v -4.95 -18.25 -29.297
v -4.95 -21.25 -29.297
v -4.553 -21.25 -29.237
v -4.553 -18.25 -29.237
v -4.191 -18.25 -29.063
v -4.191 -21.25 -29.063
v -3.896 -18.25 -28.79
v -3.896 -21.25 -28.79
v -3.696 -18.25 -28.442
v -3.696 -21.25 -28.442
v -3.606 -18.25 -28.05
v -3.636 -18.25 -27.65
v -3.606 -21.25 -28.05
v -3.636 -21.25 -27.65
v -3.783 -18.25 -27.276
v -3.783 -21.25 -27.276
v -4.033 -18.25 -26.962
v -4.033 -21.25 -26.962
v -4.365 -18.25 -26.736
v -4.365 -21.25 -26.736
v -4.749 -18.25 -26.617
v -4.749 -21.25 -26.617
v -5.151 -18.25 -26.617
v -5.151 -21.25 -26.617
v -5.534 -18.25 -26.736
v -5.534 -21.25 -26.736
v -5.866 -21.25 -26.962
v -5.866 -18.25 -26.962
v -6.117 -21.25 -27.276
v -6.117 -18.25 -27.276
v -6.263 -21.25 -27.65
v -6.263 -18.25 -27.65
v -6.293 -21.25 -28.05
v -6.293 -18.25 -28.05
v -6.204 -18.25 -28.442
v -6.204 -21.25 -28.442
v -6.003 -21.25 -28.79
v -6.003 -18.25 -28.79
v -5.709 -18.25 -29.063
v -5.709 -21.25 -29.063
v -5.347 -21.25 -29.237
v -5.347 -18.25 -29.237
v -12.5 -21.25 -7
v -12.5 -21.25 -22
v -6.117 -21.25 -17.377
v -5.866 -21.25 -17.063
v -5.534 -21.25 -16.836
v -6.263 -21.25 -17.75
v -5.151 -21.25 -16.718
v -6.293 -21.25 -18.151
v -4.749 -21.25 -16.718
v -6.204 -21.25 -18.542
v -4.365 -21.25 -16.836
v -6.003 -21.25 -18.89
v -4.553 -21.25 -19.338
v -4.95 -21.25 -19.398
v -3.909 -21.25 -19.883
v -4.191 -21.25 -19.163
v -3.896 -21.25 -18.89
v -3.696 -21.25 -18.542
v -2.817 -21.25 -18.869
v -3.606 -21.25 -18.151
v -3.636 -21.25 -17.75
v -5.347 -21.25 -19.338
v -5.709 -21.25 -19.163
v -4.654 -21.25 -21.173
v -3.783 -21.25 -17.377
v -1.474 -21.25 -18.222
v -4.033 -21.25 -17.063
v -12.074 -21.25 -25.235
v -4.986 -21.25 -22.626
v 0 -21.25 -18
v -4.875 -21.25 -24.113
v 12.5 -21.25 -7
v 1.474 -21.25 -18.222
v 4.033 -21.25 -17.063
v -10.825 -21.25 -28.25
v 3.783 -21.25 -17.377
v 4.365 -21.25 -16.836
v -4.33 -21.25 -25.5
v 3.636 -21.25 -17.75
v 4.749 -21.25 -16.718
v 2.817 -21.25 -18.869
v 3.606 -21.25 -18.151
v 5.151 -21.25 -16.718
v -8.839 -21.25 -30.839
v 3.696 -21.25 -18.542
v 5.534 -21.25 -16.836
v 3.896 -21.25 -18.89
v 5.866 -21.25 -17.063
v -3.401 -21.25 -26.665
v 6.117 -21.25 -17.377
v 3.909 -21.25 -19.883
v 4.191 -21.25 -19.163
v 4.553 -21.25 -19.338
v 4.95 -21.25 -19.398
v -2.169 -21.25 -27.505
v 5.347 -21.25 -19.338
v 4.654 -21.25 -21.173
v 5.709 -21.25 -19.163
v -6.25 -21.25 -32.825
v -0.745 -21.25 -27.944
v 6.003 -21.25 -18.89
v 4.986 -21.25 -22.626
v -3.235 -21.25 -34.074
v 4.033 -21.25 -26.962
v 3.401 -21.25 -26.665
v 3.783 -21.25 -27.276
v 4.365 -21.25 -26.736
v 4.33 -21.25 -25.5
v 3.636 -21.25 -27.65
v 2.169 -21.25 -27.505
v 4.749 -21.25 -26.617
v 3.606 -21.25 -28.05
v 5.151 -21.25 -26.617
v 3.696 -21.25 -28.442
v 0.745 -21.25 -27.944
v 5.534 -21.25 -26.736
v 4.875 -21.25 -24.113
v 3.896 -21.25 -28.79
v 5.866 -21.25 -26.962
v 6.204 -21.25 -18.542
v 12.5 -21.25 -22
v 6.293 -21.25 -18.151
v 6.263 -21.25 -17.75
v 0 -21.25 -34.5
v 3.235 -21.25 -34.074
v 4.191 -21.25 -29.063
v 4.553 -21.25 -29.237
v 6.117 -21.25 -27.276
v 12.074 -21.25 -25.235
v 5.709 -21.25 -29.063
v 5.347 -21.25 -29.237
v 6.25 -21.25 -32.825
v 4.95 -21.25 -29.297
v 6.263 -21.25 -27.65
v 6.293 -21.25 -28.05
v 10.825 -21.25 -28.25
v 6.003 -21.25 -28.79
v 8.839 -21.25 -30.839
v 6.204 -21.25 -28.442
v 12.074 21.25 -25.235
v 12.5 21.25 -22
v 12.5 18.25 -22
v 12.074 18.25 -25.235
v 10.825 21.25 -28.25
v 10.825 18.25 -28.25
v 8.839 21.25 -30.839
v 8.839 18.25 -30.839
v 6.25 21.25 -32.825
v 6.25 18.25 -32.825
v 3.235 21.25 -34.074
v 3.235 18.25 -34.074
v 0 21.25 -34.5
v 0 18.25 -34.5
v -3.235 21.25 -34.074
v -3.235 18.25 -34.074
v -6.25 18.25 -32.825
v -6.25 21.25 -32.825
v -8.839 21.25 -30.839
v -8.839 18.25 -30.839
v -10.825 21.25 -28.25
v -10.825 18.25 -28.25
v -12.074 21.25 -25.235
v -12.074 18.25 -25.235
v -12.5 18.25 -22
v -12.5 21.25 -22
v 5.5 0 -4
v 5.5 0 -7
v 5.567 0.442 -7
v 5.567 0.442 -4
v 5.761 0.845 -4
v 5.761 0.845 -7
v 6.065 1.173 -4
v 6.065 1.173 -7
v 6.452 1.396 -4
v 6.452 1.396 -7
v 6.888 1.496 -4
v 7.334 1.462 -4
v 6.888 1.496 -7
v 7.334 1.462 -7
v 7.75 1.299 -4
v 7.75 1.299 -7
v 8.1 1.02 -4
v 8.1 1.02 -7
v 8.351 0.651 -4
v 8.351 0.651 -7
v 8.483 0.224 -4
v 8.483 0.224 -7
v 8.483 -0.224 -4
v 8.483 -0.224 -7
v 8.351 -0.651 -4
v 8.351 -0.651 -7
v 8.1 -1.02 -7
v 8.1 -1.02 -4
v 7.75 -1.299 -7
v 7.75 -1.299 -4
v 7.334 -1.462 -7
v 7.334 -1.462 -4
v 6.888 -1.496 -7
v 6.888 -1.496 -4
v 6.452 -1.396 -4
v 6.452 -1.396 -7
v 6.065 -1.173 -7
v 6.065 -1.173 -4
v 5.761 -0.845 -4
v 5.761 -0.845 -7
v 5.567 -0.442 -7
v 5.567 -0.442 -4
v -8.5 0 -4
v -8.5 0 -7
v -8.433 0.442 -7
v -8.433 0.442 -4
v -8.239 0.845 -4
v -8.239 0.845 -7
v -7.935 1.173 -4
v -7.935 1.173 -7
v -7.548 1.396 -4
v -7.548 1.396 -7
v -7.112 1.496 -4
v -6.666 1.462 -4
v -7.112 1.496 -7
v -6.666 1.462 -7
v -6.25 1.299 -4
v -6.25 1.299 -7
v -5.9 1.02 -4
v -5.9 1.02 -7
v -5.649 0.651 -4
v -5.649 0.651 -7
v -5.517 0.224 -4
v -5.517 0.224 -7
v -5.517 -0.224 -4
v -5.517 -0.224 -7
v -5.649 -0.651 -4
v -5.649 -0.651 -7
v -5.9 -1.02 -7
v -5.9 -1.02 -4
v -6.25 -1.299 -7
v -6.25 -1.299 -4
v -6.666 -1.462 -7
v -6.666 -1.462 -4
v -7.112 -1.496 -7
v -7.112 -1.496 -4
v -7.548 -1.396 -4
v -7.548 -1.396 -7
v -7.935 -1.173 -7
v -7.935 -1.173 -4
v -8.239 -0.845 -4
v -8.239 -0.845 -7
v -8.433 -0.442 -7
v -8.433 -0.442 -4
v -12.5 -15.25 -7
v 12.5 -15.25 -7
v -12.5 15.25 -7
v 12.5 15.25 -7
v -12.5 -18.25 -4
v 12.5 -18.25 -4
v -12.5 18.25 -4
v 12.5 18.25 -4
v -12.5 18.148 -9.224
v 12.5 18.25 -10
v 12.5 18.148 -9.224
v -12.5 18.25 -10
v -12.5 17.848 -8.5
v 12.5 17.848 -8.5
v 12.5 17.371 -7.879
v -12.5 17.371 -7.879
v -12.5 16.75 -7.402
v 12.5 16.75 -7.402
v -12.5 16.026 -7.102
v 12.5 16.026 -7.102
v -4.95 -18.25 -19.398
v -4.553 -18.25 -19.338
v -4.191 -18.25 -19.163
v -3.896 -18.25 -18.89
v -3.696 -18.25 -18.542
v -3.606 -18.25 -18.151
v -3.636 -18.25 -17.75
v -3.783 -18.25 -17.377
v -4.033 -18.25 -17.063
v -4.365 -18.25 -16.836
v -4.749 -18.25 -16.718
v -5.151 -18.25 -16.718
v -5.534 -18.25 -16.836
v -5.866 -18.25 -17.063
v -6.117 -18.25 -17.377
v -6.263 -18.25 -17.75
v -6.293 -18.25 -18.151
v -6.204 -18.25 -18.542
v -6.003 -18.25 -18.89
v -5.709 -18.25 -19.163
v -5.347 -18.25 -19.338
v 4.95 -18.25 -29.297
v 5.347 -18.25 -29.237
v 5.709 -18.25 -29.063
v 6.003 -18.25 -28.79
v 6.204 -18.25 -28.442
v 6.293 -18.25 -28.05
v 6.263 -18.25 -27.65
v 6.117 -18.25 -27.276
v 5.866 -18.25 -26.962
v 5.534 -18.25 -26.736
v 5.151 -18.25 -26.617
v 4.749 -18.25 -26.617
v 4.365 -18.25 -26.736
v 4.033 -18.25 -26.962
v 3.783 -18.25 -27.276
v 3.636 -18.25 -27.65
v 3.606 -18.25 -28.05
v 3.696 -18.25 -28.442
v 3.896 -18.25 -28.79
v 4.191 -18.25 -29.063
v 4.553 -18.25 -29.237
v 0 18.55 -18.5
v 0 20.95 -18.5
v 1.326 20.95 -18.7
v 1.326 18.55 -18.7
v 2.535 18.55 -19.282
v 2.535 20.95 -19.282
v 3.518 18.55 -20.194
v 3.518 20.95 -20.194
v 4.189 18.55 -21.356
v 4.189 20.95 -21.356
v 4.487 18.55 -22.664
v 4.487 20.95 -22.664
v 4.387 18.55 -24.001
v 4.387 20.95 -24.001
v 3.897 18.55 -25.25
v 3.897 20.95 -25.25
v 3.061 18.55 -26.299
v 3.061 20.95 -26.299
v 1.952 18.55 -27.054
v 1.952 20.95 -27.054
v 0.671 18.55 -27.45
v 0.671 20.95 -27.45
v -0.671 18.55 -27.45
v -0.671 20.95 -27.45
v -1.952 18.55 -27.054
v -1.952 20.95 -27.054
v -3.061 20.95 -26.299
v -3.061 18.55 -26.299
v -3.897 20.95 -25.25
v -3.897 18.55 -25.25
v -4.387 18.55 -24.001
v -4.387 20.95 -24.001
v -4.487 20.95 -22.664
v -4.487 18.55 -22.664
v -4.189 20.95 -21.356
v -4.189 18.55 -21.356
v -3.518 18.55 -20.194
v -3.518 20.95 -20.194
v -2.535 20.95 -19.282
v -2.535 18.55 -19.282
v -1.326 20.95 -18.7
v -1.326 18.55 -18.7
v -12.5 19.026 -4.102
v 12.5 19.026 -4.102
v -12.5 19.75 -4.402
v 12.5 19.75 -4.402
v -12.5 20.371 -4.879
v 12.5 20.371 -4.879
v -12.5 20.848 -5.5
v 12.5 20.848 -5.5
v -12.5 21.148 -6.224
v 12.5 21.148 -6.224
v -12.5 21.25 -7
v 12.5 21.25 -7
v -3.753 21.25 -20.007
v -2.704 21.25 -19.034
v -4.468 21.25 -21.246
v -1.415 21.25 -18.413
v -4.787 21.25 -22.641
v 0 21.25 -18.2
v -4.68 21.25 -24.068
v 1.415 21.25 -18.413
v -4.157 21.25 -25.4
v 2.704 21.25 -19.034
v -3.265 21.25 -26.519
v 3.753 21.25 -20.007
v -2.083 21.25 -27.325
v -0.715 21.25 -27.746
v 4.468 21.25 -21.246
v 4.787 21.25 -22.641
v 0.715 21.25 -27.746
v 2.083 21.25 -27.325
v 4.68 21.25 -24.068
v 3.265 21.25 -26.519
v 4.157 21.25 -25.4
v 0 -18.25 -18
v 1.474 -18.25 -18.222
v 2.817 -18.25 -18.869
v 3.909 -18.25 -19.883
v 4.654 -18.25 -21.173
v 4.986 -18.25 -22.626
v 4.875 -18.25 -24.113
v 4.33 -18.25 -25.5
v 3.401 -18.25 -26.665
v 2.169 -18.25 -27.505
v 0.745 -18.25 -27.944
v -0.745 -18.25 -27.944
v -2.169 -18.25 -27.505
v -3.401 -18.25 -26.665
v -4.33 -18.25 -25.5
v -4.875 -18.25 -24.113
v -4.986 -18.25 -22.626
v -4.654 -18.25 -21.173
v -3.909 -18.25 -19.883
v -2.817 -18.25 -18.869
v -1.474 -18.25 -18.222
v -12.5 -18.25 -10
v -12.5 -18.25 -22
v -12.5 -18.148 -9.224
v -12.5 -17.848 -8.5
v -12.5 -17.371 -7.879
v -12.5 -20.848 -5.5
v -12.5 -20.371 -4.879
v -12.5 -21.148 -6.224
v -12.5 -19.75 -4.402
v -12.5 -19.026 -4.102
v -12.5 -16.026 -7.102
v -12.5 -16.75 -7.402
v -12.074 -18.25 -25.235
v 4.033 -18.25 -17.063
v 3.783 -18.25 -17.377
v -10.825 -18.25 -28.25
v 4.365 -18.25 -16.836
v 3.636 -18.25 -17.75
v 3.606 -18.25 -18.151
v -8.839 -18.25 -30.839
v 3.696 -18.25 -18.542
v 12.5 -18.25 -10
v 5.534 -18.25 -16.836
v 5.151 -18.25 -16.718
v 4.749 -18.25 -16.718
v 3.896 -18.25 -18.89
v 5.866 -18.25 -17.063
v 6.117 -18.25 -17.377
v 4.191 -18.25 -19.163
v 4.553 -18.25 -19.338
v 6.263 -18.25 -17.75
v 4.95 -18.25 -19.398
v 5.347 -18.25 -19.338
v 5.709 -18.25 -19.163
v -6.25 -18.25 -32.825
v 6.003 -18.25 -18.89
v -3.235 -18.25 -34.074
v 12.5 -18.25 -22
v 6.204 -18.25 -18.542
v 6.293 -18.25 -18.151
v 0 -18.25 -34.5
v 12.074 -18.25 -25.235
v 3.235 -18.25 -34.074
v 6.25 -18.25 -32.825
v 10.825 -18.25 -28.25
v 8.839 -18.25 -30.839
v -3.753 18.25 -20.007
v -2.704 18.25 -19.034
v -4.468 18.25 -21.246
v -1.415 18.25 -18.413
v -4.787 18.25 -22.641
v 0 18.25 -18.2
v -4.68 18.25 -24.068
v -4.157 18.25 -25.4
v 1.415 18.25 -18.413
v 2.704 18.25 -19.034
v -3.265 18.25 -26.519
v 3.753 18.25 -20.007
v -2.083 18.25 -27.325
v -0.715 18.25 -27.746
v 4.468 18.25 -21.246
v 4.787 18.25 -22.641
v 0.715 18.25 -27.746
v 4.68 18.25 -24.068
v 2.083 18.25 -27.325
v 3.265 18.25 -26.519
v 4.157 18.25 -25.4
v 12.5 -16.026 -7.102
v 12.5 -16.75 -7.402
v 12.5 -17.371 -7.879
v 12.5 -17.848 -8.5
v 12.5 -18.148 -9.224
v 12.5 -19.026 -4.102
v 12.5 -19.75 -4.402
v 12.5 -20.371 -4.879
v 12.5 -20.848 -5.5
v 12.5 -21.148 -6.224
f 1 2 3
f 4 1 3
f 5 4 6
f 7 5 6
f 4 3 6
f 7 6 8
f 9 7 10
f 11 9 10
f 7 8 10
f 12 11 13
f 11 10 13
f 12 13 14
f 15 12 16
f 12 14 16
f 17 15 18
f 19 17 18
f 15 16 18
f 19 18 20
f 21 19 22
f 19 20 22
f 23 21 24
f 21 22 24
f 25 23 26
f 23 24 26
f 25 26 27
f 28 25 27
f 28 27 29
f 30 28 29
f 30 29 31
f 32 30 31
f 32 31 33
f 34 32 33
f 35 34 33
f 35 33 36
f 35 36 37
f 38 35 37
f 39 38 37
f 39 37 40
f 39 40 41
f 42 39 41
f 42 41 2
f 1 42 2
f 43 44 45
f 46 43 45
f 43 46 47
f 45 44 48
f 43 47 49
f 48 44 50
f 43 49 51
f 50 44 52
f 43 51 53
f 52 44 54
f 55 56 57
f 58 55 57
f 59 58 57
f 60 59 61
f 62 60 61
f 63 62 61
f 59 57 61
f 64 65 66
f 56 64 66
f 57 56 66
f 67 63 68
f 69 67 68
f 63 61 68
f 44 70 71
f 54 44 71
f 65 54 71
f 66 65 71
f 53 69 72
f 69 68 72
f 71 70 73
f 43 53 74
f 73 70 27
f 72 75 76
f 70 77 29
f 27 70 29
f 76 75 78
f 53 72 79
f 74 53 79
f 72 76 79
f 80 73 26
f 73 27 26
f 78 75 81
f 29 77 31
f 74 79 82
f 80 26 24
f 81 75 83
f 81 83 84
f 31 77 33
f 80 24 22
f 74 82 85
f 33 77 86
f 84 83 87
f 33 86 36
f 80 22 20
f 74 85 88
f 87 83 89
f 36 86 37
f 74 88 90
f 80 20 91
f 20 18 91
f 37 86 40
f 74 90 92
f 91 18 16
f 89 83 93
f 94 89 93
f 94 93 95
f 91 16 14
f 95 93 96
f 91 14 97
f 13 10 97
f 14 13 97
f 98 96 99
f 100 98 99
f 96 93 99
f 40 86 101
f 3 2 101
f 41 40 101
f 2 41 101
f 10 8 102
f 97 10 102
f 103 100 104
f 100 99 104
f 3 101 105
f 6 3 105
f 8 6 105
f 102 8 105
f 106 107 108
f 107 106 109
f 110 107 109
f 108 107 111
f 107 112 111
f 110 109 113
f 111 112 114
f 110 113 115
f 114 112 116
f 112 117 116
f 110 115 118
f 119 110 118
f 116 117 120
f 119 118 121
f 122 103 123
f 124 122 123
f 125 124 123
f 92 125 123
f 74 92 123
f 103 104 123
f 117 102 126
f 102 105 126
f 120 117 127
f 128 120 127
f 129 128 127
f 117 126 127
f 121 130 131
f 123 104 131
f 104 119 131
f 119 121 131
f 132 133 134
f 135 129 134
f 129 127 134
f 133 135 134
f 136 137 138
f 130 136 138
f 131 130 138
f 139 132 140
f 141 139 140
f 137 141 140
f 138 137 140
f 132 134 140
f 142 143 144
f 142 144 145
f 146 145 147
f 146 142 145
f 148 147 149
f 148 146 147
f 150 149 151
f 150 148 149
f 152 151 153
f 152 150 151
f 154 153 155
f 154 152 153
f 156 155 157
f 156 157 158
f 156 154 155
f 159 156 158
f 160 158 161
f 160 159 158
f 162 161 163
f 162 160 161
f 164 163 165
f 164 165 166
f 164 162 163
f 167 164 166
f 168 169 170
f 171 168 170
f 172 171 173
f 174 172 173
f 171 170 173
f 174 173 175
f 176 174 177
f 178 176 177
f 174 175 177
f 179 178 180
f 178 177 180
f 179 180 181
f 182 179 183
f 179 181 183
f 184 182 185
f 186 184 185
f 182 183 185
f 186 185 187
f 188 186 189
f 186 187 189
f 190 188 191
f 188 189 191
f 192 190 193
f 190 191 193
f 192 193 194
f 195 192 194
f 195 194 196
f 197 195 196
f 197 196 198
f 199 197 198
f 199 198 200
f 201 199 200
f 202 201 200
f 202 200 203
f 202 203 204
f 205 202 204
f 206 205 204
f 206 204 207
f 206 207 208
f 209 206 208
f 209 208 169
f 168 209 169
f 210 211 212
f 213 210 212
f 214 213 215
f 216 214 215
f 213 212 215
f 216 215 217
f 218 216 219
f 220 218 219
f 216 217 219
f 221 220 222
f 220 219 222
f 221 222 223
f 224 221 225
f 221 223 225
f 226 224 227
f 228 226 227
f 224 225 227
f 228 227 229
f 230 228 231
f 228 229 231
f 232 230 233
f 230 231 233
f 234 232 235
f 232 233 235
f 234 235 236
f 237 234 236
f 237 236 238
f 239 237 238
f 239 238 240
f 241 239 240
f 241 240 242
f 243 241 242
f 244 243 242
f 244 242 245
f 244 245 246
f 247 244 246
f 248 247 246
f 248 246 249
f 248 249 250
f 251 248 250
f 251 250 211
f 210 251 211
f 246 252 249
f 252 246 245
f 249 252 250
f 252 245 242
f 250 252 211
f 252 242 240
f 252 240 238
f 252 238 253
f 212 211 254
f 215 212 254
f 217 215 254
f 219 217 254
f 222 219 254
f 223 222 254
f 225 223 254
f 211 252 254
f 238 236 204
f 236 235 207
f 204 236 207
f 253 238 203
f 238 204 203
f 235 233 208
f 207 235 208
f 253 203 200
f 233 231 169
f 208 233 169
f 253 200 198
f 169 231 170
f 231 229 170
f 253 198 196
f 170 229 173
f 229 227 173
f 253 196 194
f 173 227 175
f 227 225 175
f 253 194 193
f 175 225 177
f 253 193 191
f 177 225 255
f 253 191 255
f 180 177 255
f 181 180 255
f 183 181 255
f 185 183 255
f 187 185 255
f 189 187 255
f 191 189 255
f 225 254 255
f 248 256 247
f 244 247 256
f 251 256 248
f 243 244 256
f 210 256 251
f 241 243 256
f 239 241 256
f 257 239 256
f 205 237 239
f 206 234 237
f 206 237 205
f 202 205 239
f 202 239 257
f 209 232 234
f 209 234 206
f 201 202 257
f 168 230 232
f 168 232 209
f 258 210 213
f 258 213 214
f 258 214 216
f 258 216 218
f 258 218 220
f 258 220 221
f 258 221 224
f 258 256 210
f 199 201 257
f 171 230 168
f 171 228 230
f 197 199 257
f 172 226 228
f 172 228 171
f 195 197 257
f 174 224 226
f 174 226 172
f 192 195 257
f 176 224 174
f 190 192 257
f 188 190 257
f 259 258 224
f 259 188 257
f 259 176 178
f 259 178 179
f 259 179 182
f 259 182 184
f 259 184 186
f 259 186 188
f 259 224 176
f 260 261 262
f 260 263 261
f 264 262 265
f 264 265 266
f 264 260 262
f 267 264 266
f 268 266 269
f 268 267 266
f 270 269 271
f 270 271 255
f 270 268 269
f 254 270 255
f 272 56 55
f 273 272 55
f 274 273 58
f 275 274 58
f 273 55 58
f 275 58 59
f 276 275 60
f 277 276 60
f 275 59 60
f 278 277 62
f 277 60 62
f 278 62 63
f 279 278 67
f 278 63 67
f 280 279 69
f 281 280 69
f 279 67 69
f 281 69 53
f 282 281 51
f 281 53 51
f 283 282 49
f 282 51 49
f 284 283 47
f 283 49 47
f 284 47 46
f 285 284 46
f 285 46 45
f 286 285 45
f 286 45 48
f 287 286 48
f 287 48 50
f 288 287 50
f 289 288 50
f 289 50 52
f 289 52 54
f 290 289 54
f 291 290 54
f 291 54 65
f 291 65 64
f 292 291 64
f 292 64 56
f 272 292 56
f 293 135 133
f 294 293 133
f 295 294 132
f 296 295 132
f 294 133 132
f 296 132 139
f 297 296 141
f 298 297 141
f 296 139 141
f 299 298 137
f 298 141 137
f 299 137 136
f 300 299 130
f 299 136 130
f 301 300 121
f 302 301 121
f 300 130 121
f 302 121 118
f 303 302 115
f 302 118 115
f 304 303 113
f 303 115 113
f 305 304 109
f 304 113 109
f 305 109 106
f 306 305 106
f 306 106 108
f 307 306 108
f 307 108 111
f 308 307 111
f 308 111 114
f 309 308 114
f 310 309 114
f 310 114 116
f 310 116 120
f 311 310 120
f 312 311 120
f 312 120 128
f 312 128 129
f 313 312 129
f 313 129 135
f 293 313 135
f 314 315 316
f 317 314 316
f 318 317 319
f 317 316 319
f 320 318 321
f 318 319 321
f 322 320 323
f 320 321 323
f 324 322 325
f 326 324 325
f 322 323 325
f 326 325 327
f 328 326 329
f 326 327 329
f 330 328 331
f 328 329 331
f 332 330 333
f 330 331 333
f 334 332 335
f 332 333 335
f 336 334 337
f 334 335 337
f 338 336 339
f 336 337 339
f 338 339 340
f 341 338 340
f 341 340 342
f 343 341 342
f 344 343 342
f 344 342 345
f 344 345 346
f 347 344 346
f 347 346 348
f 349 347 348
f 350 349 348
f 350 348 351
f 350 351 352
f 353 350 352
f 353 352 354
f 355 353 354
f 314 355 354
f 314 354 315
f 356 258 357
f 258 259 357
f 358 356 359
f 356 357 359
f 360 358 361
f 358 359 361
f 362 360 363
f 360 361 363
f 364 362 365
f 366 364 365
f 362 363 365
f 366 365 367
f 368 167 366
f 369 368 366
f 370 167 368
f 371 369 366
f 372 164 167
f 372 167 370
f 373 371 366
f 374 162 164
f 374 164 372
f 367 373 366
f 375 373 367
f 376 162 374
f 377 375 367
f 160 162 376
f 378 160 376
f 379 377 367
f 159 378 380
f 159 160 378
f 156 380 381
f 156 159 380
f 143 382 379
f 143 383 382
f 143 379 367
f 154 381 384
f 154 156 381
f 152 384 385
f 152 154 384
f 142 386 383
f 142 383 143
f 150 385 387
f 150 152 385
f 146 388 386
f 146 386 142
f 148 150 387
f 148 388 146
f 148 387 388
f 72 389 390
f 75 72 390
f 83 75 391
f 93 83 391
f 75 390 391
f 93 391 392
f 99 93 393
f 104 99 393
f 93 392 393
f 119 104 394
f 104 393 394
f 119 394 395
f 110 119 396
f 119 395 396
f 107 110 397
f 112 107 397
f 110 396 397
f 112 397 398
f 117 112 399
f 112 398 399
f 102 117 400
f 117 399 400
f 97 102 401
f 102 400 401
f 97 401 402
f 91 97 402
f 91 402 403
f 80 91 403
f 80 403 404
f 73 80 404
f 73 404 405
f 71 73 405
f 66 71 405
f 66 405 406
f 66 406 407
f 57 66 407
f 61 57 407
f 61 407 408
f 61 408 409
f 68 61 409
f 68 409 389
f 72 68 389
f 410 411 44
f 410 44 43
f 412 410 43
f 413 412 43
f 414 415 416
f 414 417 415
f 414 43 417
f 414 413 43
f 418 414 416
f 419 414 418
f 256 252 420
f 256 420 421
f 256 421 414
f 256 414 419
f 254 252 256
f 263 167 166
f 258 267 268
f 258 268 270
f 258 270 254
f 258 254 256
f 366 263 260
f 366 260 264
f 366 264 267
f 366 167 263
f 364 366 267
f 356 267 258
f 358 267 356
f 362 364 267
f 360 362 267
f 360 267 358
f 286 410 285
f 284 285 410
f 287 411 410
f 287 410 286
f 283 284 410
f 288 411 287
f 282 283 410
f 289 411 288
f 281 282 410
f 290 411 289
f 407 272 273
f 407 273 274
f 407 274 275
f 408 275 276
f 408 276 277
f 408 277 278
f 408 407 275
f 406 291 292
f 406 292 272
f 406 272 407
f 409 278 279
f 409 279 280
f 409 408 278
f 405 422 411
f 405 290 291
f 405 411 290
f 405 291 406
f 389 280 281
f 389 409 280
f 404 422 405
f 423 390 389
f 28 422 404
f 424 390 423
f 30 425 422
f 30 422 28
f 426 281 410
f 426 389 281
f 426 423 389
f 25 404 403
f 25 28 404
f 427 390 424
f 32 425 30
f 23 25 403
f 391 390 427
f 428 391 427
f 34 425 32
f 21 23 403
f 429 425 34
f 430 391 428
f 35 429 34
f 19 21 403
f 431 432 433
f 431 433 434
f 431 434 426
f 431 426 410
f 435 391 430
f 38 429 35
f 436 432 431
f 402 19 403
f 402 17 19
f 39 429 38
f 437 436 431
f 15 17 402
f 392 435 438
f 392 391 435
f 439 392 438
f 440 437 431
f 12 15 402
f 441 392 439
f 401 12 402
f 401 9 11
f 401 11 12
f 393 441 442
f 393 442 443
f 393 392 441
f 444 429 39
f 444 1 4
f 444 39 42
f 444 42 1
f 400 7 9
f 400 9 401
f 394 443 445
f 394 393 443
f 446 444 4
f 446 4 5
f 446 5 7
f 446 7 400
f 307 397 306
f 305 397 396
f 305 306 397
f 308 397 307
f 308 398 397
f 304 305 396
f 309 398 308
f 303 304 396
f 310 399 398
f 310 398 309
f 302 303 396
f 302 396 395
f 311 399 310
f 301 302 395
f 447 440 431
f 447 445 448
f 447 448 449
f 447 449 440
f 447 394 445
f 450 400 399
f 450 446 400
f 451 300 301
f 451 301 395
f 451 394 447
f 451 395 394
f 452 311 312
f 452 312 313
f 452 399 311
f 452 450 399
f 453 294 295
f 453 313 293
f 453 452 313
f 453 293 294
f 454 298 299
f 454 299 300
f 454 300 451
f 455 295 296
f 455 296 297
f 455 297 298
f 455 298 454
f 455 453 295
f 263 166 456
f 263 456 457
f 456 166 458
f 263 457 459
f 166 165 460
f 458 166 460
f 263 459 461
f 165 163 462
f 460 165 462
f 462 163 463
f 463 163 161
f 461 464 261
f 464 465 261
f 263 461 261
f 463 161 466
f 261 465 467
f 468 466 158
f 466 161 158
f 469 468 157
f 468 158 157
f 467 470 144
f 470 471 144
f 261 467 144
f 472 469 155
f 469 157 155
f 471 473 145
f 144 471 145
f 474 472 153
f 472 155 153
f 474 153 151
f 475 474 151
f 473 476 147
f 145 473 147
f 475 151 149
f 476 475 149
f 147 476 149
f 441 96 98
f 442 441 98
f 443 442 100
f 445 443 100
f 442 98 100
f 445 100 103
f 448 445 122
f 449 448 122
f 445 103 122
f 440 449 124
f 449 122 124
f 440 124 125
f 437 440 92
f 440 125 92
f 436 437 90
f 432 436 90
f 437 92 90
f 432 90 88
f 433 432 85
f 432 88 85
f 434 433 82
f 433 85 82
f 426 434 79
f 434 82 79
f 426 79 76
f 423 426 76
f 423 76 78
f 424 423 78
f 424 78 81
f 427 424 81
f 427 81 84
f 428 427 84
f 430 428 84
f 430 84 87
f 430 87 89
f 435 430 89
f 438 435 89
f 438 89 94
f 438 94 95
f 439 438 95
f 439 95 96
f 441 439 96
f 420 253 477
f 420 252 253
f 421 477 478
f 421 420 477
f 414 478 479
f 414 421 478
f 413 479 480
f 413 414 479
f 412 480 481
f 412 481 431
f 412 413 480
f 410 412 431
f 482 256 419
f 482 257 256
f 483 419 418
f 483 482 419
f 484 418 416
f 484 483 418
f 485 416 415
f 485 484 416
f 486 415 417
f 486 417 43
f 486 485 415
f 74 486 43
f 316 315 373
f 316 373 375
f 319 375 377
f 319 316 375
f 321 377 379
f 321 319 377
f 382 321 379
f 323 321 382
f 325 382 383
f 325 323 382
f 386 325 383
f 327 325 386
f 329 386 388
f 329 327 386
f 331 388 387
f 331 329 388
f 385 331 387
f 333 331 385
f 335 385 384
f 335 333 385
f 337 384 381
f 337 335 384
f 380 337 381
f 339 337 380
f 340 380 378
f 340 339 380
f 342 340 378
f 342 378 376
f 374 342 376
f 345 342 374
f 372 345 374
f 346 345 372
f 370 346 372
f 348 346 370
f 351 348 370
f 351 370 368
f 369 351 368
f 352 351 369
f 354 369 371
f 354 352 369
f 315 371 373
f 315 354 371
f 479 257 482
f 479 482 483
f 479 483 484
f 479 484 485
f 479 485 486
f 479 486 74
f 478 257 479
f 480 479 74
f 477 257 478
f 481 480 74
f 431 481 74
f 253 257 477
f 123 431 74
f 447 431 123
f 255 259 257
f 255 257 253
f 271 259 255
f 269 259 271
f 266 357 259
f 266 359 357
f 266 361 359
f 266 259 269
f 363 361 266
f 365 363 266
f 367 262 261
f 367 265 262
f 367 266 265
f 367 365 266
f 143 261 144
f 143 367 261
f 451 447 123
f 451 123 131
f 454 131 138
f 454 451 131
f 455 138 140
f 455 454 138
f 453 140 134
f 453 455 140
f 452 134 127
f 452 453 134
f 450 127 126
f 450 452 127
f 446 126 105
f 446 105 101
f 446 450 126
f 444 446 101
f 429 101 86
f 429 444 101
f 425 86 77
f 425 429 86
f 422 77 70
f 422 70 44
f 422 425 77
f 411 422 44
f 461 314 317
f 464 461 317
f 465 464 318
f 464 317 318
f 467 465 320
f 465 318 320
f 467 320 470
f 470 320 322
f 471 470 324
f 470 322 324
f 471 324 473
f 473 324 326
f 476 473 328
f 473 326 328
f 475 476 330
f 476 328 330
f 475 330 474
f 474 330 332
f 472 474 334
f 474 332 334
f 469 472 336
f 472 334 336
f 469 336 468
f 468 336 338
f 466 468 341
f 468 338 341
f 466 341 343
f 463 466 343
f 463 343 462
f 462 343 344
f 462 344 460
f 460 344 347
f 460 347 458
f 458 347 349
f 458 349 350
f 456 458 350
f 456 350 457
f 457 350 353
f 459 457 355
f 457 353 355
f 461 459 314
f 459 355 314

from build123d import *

# Parameters (mm, degrees)
BOSS_EXTRUDE3_DEPTH = 21.25
SHELL1_T            = -3
SKETCH6_R           = 4.5
CUT_EXTRUDE4_DEPTH  = 8.5
SKETCH8_R           = 1.347336496
CUT_EXTRUDE5_DEPTH  = 6
SKETCH9_R           = 1.5
CUT_EXTRUDE6_DEPTH  = 10
FILLET1_R           = 3
SKETCH11_R          = 5
CUT_EXTRUDE7_DEPTH  = 10
CHAMFER1_SIZE       = 0.3


with BuildPart() as part:
    # Sketch3 → Boss-Extrude3 (new, symmetric)
    with BuildSketch(Plane(origin=(0, 0, 0), x_dir=(1, 0, 0), z_dir=(0, 1, 0))):
        with BuildLine():
            Line((-12.5, 4), (12.5, 4))
            Line((12.5, 4), (12.5, 22))
            ThreePointArc((12.5, 22), (0, 34.5), (-12.5, 22))
            Line((-12.5, 22), (-12.5, 4))
        make_face()
    extrude(amount=BOSS_EXTRUDE3_DEPTH, both=True)

    # Shell1
    shell1_openings = [part.faces().sort_by_distance(p)[0] for p in [
        (0, 0, -34.5),
        (12.5, 0, -13),
        (-12.5, 0, -13),
    ]]
    offset(amount=SHELL1_T, openings=shell1_openings, kind=Kind.INTERSECTION)

    # Sketch6 → Cut-Extrude4 (cut)
    with BuildSketch(Plane(origin=(0, 21.25, 0), x_dir=(1, 0, 0), z_dir=(0, 1, 0))):
        with Locations(Location((0, 23, 0), (0, 0, 270))):
            Circle(SKETCH6_R)
    extrude(amount=-CUT_EXTRUDE4_DEPTH, mode=Mode.SUBTRACT)

    # Sketch8 → Cut-Extrude5 (cut)
    with BuildSketch(Plane(origin=(0, -21.25, 0), x_dir=(-1, 0, 0), z_dir=(0, -1, 0))):
        with Locations(Location((4.949747468, 18.050252532, 0), (0, 0, 90))):
            Circle(SKETCH8_R)
        with Locations(Location((-4.949747468, 18.050252532, 0), (0, 0, 90))):
            Circle(SKETCH8_R)
        with Locations(Location((-4.949747468, 27.949747468, 0), (0, 0, 90))):
            Circle(SKETCH8_R)
        with Locations(Location((4.949747468, 27.949747468, 0), (0, 0, 90))):
            Circle(SKETCH8_R)
    extrude(amount=-CUT_EXTRUDE5_DEPTH, mode=Mode.SUBTRACT)

    # Sketch9 → Cut-Extrude6 (cut)
    with BuildSketch(Plane(origin=(0, 0, -7), x_dir=(-1, 0, 0), z_dir=(0, 0, -1))):
        with Locations((-7, 0)):
            Circle(SKETCH9_R)
        with Locations((7, 0)):
            Circle(SKETCH9_R)
    extrude(amount=-CUT_EXTRUDE6_DEPTH, mode=Mode.SUBTRACT)

    # Fillet1
    fillet1_edges = [part.edges().sort_by_distance(p)[0] for p in [
        (0, -18.25, -7),
        (0, 18.25, -7),
        (0, -21.25, -4),
        (0, 21.25, -4),
    ]]
    fillet(fillet1_edges, radius=FILLET1_R)

    # Sketch11 → Cut-Extrude7 (cut)
    with BuildSketch(Plane(origin=(0, -18.25, 0), x_dir=(1, 0, 0), z_dir=(0, 1, 0))):
        with Locations(Location((0, 23, 0), (0, 0, 270))):
            Circle(SKETCH11_R)
    extrude(amount=-CUT_EXTRUDE7_DEPTH, mode=Mode.SUBTRACT)

    # Chamfer1
    chamfer1_edges = [part.edges().sort_by_distance(p)[0] for p in [
        (0, 18.25, -27.5),
        (0, 21.25, -27.5),
    ]]
    chamfer(chamfer1_edges, length=CHAMFER1_SIZE)


solid = part.part
